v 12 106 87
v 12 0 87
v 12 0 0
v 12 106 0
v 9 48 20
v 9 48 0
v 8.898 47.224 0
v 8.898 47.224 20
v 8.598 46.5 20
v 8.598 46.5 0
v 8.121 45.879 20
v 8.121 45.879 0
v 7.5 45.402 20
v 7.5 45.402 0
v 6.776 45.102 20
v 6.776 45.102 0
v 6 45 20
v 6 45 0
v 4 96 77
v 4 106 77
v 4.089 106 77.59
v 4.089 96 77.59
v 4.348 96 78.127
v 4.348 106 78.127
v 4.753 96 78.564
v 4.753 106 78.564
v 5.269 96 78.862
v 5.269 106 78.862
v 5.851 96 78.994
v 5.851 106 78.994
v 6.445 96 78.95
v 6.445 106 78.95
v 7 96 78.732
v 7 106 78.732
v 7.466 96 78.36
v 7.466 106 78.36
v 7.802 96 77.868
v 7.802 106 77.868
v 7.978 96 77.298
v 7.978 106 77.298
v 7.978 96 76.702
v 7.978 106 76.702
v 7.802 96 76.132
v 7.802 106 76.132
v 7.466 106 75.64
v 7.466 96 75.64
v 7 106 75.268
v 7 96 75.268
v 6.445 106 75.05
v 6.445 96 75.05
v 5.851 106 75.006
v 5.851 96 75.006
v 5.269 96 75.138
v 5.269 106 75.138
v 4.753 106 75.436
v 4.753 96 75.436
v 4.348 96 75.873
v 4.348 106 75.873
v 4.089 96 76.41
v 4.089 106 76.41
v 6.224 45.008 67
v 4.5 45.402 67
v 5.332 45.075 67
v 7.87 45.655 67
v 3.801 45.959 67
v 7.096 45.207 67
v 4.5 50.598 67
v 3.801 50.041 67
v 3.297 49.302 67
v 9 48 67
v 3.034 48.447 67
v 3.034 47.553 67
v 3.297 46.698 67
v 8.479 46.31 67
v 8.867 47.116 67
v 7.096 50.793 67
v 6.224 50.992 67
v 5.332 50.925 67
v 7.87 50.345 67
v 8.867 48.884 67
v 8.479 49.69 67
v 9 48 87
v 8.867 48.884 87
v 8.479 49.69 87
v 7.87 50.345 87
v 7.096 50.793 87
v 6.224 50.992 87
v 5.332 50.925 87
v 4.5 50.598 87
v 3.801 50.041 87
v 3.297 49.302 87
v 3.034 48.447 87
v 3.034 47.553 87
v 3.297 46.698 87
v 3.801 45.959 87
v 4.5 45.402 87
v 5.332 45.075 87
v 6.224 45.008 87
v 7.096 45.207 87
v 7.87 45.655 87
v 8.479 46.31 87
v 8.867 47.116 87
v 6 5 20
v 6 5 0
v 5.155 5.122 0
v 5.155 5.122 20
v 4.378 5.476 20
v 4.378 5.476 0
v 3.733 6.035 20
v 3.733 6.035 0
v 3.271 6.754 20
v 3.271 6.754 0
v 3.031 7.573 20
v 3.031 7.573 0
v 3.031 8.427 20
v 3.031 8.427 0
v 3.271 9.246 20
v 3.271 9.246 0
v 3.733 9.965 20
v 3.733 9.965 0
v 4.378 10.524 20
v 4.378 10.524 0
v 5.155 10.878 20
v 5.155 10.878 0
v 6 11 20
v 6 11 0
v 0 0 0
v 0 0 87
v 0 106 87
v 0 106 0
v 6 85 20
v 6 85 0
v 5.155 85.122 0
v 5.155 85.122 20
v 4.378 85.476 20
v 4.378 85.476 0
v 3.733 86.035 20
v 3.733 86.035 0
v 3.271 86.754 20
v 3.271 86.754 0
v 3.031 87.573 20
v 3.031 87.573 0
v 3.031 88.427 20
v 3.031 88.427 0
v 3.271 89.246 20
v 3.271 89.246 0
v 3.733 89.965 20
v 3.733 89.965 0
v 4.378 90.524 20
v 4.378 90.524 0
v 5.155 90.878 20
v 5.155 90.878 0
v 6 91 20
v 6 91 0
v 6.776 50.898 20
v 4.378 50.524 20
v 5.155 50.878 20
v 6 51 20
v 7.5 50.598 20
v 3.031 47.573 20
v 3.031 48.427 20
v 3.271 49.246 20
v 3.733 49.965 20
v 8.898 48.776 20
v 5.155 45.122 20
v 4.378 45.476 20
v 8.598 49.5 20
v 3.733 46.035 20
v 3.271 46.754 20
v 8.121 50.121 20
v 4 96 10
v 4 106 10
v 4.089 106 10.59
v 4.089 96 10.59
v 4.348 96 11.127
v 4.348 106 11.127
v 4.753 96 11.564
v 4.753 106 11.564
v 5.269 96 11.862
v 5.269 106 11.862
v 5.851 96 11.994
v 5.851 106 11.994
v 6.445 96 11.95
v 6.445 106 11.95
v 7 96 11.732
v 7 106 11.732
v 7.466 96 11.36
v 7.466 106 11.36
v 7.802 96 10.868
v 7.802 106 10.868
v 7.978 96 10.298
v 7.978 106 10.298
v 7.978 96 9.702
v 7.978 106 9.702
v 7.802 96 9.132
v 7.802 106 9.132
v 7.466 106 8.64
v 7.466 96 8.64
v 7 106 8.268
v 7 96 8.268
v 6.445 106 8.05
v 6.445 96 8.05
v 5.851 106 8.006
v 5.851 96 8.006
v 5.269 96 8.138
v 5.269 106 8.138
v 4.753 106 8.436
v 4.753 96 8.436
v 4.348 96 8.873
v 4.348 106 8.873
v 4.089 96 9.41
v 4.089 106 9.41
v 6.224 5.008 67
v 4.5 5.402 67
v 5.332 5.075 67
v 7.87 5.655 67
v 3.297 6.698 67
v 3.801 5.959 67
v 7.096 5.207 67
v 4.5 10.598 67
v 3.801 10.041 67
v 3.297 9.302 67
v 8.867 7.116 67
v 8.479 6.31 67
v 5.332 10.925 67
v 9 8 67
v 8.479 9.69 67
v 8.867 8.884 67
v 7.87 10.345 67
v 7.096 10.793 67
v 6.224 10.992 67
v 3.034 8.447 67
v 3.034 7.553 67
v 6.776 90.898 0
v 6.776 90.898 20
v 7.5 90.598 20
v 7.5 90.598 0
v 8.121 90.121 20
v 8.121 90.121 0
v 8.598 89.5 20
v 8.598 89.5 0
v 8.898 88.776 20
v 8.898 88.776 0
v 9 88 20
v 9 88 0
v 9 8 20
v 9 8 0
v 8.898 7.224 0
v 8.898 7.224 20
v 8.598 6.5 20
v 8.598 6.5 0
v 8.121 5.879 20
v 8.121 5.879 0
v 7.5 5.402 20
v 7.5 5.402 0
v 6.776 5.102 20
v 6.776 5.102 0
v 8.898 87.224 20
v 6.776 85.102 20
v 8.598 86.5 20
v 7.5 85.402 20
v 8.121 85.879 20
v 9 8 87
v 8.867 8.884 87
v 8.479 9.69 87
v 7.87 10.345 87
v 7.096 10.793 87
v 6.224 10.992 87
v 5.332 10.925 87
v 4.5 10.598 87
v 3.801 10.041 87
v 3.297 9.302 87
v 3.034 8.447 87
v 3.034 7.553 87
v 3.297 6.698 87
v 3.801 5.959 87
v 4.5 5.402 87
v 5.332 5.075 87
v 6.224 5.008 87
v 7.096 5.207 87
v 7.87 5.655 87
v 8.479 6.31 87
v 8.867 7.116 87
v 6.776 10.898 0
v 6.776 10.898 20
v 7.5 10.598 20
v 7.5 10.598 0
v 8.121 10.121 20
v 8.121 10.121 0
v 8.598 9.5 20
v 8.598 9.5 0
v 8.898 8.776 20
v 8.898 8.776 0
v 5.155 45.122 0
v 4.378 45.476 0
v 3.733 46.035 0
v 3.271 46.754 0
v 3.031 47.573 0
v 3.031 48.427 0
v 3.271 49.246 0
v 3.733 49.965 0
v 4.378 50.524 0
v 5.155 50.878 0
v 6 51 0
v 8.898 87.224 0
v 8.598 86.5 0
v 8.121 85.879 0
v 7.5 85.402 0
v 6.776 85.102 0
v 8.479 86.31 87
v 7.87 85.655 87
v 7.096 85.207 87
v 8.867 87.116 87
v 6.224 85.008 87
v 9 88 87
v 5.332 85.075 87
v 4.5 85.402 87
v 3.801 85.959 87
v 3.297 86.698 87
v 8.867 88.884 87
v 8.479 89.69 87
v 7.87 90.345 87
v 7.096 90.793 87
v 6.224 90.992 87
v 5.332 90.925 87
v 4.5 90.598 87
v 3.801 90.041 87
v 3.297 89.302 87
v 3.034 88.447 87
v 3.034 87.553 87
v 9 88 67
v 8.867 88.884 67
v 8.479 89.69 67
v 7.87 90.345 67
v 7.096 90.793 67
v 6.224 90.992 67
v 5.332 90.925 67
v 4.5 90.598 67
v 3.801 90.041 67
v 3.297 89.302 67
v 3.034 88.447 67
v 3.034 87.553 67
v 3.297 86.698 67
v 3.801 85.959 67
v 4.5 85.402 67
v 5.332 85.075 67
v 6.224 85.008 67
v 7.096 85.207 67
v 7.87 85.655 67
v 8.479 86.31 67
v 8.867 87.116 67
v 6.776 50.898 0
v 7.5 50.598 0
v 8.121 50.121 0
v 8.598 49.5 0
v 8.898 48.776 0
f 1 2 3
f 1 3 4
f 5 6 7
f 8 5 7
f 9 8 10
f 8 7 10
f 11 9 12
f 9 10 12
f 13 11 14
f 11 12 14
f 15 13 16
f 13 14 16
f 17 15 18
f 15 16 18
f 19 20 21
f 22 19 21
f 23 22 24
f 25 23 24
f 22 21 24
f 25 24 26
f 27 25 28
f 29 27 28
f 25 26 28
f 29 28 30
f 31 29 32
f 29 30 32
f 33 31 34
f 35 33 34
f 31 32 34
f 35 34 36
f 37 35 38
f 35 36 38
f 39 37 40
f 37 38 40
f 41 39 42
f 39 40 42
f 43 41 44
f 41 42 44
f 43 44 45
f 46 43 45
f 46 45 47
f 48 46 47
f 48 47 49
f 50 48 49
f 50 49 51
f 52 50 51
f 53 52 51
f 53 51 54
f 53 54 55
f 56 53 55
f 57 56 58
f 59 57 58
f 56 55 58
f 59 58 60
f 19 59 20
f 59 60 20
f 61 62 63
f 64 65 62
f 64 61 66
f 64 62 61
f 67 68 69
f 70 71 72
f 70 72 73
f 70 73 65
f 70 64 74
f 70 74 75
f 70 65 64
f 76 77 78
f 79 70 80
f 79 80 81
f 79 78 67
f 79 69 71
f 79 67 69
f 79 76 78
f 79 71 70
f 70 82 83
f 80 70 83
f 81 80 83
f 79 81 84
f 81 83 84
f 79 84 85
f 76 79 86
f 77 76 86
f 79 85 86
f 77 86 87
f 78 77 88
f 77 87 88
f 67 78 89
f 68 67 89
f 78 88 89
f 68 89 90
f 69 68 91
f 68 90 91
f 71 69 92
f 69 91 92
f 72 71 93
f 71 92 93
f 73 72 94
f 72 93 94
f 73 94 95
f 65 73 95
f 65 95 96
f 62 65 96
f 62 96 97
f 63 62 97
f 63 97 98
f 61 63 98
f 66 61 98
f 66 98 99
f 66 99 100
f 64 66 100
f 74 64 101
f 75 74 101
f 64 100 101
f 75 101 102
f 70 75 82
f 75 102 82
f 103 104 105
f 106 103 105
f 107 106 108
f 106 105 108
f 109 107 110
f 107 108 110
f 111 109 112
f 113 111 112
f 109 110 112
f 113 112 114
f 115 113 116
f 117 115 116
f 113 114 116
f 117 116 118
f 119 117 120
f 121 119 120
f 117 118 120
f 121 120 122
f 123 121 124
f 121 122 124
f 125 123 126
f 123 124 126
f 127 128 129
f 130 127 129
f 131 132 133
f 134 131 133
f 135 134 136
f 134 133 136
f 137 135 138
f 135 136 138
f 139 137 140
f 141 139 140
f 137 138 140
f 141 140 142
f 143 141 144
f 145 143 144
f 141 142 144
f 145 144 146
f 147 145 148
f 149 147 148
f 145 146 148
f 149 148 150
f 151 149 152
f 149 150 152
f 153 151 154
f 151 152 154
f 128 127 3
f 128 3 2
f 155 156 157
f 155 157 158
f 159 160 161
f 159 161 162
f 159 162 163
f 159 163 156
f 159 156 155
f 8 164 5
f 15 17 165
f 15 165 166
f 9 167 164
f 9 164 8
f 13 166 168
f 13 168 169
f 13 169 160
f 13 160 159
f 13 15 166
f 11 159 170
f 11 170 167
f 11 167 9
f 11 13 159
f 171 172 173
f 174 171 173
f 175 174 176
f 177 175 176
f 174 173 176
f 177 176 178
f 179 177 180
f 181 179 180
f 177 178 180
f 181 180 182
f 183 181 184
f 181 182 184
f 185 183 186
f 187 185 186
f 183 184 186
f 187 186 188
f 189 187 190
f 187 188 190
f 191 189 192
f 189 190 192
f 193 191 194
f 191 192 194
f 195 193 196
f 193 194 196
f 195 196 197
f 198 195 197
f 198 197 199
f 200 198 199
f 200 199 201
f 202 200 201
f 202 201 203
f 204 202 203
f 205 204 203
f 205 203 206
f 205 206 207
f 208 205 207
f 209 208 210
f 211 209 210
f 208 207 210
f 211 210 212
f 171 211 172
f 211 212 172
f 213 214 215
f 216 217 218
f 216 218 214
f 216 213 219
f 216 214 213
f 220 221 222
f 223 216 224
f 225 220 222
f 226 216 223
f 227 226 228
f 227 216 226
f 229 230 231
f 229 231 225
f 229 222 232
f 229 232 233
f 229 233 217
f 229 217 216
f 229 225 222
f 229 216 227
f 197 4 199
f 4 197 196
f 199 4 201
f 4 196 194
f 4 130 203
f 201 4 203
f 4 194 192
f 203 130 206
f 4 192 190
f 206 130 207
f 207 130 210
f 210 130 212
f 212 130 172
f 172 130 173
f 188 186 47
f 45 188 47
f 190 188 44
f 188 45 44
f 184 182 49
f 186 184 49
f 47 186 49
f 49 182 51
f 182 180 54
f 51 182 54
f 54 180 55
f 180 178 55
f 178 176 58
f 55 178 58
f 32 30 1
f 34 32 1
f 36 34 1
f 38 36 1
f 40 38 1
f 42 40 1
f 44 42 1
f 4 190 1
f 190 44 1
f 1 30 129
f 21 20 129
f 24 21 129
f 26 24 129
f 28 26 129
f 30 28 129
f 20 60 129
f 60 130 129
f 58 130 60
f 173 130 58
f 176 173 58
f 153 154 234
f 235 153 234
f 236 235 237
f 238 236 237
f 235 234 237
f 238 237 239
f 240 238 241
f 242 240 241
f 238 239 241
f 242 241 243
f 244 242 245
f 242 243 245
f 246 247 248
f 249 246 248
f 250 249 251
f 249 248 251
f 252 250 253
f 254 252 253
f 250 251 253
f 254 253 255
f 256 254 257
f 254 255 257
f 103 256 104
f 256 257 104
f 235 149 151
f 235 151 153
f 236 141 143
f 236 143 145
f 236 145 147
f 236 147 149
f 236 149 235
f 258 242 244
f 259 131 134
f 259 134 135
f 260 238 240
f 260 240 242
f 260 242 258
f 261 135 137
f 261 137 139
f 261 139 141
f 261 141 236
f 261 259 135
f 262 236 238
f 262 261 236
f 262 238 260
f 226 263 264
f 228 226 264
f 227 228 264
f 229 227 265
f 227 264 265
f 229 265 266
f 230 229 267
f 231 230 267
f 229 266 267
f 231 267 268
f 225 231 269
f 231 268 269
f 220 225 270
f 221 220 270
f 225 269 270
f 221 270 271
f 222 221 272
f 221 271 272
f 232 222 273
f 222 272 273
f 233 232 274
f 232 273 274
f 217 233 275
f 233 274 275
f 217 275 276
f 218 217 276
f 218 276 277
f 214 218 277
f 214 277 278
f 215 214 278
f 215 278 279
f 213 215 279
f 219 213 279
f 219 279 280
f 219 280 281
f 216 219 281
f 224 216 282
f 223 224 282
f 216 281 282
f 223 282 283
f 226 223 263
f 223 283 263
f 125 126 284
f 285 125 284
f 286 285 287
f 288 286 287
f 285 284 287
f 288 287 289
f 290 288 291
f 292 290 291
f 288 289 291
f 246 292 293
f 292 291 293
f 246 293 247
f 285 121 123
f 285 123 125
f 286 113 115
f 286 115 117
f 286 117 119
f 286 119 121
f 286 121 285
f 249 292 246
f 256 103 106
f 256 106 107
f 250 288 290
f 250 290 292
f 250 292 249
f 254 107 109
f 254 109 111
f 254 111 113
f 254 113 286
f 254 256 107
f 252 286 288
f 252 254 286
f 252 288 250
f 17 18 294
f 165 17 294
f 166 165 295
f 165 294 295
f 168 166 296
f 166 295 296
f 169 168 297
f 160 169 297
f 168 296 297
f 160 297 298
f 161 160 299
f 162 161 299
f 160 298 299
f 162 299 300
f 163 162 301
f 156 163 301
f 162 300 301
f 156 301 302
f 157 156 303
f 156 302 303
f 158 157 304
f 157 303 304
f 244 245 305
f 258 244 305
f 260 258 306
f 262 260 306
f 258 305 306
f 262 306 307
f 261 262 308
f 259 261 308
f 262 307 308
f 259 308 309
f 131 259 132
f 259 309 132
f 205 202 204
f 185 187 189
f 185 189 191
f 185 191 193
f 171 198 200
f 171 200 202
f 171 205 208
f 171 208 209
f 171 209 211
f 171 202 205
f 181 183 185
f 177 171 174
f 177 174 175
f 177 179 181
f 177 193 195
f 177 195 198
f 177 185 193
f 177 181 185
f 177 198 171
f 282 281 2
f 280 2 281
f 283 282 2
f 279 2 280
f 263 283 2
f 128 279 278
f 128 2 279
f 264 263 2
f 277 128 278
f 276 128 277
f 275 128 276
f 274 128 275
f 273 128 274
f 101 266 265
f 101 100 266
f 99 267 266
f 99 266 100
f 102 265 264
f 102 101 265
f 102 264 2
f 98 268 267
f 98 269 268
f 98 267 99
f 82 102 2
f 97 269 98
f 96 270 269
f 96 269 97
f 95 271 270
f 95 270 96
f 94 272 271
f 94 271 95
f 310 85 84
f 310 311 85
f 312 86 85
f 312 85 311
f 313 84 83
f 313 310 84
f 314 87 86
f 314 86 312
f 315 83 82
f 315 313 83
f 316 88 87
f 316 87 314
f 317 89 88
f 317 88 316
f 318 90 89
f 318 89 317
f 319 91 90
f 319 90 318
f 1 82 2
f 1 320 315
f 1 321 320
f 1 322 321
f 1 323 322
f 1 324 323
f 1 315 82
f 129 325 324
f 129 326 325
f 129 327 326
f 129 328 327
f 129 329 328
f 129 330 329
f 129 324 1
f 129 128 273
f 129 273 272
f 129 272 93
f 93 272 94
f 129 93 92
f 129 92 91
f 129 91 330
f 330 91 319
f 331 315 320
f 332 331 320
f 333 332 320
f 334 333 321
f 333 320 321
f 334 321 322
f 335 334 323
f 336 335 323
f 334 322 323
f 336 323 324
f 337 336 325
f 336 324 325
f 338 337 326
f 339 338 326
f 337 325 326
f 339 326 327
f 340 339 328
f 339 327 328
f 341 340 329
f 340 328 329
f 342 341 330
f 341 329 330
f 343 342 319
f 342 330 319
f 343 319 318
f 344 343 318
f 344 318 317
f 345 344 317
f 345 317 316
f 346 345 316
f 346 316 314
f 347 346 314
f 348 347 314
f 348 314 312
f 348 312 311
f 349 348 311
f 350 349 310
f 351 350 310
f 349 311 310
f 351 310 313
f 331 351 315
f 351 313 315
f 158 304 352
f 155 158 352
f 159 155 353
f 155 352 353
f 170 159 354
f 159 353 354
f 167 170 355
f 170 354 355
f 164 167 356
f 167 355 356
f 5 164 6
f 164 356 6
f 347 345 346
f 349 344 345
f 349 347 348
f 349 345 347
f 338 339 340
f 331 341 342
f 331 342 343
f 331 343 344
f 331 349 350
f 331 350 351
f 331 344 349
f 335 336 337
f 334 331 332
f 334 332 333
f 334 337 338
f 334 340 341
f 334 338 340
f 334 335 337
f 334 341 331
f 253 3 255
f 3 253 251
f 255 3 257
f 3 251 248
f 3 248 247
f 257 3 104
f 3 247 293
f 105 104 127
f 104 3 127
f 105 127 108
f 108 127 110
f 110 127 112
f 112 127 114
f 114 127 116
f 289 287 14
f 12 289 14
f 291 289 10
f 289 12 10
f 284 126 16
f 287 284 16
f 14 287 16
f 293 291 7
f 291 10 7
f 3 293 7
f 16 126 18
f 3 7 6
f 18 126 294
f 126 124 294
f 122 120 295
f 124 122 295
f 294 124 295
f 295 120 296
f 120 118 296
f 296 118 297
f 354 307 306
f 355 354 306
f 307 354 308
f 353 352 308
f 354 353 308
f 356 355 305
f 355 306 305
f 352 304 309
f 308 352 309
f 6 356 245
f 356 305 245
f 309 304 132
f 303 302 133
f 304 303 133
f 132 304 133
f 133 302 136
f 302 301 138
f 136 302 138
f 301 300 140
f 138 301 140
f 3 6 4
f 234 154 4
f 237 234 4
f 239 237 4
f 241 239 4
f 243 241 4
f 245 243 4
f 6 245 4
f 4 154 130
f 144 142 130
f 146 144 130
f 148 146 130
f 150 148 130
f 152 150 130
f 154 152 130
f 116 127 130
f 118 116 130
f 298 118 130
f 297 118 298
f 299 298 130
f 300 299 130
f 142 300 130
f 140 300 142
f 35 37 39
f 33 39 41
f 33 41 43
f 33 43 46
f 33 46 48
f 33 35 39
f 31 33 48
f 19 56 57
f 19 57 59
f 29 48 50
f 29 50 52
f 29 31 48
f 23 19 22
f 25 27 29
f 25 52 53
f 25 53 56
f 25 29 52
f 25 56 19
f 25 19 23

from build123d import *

# Parameters (mm, degrees)
F0_W     = 106
F0_H     = 87
F1_DEPTH = 12
F2_R     = 3
F3_DEPTH = 20
F5_DEPTH = 20
F6_DEPTH = 20
F7_R     = 2
F8_DEPTH = 10


with BuildPart() as f1:
    # F0 (on Right) → F1 (new body)
    with BuildSketch(Plane.YZ):
        with Locations((53, 43.5)):
            Rectangle(F0_W, F0_H)
    extrude(amount=F1_DEPTH)

    # F2 (on face) → F3 (cut)
    with BuildSketch(Plane.XY.offset(87)):
        with Locations((6, 88)):
            Circle(F2_R)
        with Locations((6, 48)):
            Circle(F2_R)
        with Locations((6, 8)):
            Circle(F2_R)
    extrude(amount=-F3_DEPTH, mode=Mode.SUBTRACT)

    # F2 (on face) → F5 (cut)
    with BuildSketch(Plane.XY.offset(87)):
        with Locations((6, 88)):
            Circle(F2_R)
        with Locations((6, 48)):
            Circle(F2_R)
        with Locations((6, 8)):
            Circle(F2_R)
    extrude(amount=-F5_DEPTH, mode=Mode.SUBTRACT)

    # F4 (on face) → F6 (cut)
    with BuildSketch(Plane(origin=(0, 0, 0), x_dir=(1, 0, 0), z_dir=(0, 0, -1))):
        with BuildLine():
            ThreePointArc((6, -85), (3, -88), (6, -91))
            Line((6, -91), (6, -88))
            Line((6, -88), (6, -85))
        make_face()
        with BuildLine():
            ThreePointArc((6, -5), (3, -8), (6, -11))
            Line((6, -11), (6, -5))
        make_face()
        with BuildLine():
            Line((6, -5), (6, -11))
            ThreePointArc((6, -11), (8.12132, -10.12132), (9, -8))
            ThreePointArc((9, -8), (8.12132, -5.87868), (6, -5))
        make_face()
        with BuildLine():
            ThreePointArc((6, -45), (3, -48), (6, -51))
            Line((6, -51), (6, -48))
            Line((6, -48), (6, -45))
        make_face()
        with BuildLine():
            Line((6, -48), (6, -51))
            ThreePointArc((6, -51), (8.12132, -50.12132), (9, -48))
            ThreePointArc((9, -48), (8.12132, -45.87868), (6, -45))
            Line((6, -45), (6, -48))
        make_face()
        with BuildLine():
            Line((6, -88), (6, -91))
            ThreePointArc((6, -91), (8.12132, -90.12132), (9, -88))
            Line((9, -88), (6, -88))
        make_face()
        with BuildLine():
            Line((6, -85), (6, -88))
            Line((6, -88), (9, -88))
            ThreePointArc((9, -88), (8.12132, -85.87868), (6, -85))
        make_face()
    extrude(amount=-F6_DEPTH, mode=Mode.SUBTRACT)

    # F7 (on face) → F8 (cut)
    with BuildSketch(Plane(origin=(0, 106, 0), x_dir=(-1, 0, 0), z_dir=(0, 1, 0))):
        with Locations((-6, 77)):
            Circle(F7_R)
        with Locations((-6, 10)):
            Circle(F7_R)
    extrude(amount=-F8_DEPTH, mode=Mode.SUBTRACT)


solid = f1.part
